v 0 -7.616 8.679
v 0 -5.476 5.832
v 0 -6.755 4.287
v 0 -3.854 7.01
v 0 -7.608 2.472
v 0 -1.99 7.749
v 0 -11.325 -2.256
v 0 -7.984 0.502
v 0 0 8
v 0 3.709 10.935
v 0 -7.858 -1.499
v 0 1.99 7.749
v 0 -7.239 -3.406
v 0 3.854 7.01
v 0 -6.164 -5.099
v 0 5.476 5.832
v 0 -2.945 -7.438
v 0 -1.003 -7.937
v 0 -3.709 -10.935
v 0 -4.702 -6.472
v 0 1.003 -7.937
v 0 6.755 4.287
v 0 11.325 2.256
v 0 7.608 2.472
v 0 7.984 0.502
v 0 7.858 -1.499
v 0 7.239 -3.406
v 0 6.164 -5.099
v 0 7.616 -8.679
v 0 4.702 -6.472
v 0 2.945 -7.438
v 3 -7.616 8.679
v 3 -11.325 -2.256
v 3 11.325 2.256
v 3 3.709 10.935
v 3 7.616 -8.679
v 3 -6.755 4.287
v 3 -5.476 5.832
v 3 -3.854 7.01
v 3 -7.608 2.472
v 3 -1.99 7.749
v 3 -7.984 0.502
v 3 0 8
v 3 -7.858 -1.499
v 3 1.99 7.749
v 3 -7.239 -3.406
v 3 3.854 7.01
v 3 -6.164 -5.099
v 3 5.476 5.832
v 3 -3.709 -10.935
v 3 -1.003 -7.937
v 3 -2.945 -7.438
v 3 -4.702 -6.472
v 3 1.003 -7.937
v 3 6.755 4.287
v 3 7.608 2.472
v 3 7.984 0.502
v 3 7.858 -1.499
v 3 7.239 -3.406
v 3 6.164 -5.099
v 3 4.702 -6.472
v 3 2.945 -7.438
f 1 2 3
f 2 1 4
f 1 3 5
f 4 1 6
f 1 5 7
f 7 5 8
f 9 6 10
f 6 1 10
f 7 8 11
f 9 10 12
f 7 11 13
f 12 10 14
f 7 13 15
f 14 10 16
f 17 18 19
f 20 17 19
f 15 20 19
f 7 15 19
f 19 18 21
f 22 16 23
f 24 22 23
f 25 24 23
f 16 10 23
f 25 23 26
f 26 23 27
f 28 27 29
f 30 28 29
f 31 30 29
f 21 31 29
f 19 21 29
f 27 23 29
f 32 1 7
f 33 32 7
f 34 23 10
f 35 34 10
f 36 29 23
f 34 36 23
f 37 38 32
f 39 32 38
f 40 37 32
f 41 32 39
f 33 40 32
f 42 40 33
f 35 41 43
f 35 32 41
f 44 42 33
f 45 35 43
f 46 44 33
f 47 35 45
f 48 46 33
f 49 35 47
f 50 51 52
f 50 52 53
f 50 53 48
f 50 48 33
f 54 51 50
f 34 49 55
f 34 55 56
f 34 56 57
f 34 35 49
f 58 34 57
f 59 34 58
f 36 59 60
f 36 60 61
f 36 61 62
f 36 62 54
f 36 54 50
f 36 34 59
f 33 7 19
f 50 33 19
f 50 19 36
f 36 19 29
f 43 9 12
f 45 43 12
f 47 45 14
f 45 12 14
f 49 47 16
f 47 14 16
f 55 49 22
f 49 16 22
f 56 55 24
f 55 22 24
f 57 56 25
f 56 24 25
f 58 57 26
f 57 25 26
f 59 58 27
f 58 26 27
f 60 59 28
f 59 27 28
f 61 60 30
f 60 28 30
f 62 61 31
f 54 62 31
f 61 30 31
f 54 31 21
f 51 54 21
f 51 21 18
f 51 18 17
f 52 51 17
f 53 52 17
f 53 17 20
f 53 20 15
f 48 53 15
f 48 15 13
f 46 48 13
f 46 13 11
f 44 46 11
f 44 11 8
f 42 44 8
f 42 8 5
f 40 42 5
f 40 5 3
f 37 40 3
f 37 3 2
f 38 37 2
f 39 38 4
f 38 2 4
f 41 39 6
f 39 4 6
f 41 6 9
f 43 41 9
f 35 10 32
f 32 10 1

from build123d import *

# Parameters (mm, degrees)
BOSS_EXTRUDE1_DEPTH = 3
CUT_EXTRUDE1_REACH  = 5
SKETCH3_R           = 8


with BuildPart() as part:
    # Sketch2 → Boss-Extrude1 (new body)
    with BuildSketch(Plane(origin=(0, 0, 0), x_dir=(0, 0, -1), z_dir=(1, 0, 0))):
        Polygon((8.679494794, 7.615753637), (-2.255688722, 11.324539802), (-10.935183515, 3.708786165), (-8.679494794, -7.615753637), (2.255688722, -11.324539802), (10.935183515, -3.708786165), align=None)
    extrude(amount=BOSS_EXTRUDE1_DEPTH)

    # Sketch3 → Cut-Extrude1 (cut, up to next)
    with BuildSketch(Plane.ZY, mode=Mode.PRIVATE) as cut_extrude1_sk1:
        Circle(SKETCH3_R)
    cut_extrude1_tool1 = extrude(cut_extrude1_sk1.sketch, amount=-CUT_EXTRUDE1_REACH, mode=Mode.PRIVATE) & part.part
    add(cut_extrude1_tool1.solids().sort_by_distance((0, 0, 0))[0], mode=Mode.SUBTRACT)


solid = part.part
